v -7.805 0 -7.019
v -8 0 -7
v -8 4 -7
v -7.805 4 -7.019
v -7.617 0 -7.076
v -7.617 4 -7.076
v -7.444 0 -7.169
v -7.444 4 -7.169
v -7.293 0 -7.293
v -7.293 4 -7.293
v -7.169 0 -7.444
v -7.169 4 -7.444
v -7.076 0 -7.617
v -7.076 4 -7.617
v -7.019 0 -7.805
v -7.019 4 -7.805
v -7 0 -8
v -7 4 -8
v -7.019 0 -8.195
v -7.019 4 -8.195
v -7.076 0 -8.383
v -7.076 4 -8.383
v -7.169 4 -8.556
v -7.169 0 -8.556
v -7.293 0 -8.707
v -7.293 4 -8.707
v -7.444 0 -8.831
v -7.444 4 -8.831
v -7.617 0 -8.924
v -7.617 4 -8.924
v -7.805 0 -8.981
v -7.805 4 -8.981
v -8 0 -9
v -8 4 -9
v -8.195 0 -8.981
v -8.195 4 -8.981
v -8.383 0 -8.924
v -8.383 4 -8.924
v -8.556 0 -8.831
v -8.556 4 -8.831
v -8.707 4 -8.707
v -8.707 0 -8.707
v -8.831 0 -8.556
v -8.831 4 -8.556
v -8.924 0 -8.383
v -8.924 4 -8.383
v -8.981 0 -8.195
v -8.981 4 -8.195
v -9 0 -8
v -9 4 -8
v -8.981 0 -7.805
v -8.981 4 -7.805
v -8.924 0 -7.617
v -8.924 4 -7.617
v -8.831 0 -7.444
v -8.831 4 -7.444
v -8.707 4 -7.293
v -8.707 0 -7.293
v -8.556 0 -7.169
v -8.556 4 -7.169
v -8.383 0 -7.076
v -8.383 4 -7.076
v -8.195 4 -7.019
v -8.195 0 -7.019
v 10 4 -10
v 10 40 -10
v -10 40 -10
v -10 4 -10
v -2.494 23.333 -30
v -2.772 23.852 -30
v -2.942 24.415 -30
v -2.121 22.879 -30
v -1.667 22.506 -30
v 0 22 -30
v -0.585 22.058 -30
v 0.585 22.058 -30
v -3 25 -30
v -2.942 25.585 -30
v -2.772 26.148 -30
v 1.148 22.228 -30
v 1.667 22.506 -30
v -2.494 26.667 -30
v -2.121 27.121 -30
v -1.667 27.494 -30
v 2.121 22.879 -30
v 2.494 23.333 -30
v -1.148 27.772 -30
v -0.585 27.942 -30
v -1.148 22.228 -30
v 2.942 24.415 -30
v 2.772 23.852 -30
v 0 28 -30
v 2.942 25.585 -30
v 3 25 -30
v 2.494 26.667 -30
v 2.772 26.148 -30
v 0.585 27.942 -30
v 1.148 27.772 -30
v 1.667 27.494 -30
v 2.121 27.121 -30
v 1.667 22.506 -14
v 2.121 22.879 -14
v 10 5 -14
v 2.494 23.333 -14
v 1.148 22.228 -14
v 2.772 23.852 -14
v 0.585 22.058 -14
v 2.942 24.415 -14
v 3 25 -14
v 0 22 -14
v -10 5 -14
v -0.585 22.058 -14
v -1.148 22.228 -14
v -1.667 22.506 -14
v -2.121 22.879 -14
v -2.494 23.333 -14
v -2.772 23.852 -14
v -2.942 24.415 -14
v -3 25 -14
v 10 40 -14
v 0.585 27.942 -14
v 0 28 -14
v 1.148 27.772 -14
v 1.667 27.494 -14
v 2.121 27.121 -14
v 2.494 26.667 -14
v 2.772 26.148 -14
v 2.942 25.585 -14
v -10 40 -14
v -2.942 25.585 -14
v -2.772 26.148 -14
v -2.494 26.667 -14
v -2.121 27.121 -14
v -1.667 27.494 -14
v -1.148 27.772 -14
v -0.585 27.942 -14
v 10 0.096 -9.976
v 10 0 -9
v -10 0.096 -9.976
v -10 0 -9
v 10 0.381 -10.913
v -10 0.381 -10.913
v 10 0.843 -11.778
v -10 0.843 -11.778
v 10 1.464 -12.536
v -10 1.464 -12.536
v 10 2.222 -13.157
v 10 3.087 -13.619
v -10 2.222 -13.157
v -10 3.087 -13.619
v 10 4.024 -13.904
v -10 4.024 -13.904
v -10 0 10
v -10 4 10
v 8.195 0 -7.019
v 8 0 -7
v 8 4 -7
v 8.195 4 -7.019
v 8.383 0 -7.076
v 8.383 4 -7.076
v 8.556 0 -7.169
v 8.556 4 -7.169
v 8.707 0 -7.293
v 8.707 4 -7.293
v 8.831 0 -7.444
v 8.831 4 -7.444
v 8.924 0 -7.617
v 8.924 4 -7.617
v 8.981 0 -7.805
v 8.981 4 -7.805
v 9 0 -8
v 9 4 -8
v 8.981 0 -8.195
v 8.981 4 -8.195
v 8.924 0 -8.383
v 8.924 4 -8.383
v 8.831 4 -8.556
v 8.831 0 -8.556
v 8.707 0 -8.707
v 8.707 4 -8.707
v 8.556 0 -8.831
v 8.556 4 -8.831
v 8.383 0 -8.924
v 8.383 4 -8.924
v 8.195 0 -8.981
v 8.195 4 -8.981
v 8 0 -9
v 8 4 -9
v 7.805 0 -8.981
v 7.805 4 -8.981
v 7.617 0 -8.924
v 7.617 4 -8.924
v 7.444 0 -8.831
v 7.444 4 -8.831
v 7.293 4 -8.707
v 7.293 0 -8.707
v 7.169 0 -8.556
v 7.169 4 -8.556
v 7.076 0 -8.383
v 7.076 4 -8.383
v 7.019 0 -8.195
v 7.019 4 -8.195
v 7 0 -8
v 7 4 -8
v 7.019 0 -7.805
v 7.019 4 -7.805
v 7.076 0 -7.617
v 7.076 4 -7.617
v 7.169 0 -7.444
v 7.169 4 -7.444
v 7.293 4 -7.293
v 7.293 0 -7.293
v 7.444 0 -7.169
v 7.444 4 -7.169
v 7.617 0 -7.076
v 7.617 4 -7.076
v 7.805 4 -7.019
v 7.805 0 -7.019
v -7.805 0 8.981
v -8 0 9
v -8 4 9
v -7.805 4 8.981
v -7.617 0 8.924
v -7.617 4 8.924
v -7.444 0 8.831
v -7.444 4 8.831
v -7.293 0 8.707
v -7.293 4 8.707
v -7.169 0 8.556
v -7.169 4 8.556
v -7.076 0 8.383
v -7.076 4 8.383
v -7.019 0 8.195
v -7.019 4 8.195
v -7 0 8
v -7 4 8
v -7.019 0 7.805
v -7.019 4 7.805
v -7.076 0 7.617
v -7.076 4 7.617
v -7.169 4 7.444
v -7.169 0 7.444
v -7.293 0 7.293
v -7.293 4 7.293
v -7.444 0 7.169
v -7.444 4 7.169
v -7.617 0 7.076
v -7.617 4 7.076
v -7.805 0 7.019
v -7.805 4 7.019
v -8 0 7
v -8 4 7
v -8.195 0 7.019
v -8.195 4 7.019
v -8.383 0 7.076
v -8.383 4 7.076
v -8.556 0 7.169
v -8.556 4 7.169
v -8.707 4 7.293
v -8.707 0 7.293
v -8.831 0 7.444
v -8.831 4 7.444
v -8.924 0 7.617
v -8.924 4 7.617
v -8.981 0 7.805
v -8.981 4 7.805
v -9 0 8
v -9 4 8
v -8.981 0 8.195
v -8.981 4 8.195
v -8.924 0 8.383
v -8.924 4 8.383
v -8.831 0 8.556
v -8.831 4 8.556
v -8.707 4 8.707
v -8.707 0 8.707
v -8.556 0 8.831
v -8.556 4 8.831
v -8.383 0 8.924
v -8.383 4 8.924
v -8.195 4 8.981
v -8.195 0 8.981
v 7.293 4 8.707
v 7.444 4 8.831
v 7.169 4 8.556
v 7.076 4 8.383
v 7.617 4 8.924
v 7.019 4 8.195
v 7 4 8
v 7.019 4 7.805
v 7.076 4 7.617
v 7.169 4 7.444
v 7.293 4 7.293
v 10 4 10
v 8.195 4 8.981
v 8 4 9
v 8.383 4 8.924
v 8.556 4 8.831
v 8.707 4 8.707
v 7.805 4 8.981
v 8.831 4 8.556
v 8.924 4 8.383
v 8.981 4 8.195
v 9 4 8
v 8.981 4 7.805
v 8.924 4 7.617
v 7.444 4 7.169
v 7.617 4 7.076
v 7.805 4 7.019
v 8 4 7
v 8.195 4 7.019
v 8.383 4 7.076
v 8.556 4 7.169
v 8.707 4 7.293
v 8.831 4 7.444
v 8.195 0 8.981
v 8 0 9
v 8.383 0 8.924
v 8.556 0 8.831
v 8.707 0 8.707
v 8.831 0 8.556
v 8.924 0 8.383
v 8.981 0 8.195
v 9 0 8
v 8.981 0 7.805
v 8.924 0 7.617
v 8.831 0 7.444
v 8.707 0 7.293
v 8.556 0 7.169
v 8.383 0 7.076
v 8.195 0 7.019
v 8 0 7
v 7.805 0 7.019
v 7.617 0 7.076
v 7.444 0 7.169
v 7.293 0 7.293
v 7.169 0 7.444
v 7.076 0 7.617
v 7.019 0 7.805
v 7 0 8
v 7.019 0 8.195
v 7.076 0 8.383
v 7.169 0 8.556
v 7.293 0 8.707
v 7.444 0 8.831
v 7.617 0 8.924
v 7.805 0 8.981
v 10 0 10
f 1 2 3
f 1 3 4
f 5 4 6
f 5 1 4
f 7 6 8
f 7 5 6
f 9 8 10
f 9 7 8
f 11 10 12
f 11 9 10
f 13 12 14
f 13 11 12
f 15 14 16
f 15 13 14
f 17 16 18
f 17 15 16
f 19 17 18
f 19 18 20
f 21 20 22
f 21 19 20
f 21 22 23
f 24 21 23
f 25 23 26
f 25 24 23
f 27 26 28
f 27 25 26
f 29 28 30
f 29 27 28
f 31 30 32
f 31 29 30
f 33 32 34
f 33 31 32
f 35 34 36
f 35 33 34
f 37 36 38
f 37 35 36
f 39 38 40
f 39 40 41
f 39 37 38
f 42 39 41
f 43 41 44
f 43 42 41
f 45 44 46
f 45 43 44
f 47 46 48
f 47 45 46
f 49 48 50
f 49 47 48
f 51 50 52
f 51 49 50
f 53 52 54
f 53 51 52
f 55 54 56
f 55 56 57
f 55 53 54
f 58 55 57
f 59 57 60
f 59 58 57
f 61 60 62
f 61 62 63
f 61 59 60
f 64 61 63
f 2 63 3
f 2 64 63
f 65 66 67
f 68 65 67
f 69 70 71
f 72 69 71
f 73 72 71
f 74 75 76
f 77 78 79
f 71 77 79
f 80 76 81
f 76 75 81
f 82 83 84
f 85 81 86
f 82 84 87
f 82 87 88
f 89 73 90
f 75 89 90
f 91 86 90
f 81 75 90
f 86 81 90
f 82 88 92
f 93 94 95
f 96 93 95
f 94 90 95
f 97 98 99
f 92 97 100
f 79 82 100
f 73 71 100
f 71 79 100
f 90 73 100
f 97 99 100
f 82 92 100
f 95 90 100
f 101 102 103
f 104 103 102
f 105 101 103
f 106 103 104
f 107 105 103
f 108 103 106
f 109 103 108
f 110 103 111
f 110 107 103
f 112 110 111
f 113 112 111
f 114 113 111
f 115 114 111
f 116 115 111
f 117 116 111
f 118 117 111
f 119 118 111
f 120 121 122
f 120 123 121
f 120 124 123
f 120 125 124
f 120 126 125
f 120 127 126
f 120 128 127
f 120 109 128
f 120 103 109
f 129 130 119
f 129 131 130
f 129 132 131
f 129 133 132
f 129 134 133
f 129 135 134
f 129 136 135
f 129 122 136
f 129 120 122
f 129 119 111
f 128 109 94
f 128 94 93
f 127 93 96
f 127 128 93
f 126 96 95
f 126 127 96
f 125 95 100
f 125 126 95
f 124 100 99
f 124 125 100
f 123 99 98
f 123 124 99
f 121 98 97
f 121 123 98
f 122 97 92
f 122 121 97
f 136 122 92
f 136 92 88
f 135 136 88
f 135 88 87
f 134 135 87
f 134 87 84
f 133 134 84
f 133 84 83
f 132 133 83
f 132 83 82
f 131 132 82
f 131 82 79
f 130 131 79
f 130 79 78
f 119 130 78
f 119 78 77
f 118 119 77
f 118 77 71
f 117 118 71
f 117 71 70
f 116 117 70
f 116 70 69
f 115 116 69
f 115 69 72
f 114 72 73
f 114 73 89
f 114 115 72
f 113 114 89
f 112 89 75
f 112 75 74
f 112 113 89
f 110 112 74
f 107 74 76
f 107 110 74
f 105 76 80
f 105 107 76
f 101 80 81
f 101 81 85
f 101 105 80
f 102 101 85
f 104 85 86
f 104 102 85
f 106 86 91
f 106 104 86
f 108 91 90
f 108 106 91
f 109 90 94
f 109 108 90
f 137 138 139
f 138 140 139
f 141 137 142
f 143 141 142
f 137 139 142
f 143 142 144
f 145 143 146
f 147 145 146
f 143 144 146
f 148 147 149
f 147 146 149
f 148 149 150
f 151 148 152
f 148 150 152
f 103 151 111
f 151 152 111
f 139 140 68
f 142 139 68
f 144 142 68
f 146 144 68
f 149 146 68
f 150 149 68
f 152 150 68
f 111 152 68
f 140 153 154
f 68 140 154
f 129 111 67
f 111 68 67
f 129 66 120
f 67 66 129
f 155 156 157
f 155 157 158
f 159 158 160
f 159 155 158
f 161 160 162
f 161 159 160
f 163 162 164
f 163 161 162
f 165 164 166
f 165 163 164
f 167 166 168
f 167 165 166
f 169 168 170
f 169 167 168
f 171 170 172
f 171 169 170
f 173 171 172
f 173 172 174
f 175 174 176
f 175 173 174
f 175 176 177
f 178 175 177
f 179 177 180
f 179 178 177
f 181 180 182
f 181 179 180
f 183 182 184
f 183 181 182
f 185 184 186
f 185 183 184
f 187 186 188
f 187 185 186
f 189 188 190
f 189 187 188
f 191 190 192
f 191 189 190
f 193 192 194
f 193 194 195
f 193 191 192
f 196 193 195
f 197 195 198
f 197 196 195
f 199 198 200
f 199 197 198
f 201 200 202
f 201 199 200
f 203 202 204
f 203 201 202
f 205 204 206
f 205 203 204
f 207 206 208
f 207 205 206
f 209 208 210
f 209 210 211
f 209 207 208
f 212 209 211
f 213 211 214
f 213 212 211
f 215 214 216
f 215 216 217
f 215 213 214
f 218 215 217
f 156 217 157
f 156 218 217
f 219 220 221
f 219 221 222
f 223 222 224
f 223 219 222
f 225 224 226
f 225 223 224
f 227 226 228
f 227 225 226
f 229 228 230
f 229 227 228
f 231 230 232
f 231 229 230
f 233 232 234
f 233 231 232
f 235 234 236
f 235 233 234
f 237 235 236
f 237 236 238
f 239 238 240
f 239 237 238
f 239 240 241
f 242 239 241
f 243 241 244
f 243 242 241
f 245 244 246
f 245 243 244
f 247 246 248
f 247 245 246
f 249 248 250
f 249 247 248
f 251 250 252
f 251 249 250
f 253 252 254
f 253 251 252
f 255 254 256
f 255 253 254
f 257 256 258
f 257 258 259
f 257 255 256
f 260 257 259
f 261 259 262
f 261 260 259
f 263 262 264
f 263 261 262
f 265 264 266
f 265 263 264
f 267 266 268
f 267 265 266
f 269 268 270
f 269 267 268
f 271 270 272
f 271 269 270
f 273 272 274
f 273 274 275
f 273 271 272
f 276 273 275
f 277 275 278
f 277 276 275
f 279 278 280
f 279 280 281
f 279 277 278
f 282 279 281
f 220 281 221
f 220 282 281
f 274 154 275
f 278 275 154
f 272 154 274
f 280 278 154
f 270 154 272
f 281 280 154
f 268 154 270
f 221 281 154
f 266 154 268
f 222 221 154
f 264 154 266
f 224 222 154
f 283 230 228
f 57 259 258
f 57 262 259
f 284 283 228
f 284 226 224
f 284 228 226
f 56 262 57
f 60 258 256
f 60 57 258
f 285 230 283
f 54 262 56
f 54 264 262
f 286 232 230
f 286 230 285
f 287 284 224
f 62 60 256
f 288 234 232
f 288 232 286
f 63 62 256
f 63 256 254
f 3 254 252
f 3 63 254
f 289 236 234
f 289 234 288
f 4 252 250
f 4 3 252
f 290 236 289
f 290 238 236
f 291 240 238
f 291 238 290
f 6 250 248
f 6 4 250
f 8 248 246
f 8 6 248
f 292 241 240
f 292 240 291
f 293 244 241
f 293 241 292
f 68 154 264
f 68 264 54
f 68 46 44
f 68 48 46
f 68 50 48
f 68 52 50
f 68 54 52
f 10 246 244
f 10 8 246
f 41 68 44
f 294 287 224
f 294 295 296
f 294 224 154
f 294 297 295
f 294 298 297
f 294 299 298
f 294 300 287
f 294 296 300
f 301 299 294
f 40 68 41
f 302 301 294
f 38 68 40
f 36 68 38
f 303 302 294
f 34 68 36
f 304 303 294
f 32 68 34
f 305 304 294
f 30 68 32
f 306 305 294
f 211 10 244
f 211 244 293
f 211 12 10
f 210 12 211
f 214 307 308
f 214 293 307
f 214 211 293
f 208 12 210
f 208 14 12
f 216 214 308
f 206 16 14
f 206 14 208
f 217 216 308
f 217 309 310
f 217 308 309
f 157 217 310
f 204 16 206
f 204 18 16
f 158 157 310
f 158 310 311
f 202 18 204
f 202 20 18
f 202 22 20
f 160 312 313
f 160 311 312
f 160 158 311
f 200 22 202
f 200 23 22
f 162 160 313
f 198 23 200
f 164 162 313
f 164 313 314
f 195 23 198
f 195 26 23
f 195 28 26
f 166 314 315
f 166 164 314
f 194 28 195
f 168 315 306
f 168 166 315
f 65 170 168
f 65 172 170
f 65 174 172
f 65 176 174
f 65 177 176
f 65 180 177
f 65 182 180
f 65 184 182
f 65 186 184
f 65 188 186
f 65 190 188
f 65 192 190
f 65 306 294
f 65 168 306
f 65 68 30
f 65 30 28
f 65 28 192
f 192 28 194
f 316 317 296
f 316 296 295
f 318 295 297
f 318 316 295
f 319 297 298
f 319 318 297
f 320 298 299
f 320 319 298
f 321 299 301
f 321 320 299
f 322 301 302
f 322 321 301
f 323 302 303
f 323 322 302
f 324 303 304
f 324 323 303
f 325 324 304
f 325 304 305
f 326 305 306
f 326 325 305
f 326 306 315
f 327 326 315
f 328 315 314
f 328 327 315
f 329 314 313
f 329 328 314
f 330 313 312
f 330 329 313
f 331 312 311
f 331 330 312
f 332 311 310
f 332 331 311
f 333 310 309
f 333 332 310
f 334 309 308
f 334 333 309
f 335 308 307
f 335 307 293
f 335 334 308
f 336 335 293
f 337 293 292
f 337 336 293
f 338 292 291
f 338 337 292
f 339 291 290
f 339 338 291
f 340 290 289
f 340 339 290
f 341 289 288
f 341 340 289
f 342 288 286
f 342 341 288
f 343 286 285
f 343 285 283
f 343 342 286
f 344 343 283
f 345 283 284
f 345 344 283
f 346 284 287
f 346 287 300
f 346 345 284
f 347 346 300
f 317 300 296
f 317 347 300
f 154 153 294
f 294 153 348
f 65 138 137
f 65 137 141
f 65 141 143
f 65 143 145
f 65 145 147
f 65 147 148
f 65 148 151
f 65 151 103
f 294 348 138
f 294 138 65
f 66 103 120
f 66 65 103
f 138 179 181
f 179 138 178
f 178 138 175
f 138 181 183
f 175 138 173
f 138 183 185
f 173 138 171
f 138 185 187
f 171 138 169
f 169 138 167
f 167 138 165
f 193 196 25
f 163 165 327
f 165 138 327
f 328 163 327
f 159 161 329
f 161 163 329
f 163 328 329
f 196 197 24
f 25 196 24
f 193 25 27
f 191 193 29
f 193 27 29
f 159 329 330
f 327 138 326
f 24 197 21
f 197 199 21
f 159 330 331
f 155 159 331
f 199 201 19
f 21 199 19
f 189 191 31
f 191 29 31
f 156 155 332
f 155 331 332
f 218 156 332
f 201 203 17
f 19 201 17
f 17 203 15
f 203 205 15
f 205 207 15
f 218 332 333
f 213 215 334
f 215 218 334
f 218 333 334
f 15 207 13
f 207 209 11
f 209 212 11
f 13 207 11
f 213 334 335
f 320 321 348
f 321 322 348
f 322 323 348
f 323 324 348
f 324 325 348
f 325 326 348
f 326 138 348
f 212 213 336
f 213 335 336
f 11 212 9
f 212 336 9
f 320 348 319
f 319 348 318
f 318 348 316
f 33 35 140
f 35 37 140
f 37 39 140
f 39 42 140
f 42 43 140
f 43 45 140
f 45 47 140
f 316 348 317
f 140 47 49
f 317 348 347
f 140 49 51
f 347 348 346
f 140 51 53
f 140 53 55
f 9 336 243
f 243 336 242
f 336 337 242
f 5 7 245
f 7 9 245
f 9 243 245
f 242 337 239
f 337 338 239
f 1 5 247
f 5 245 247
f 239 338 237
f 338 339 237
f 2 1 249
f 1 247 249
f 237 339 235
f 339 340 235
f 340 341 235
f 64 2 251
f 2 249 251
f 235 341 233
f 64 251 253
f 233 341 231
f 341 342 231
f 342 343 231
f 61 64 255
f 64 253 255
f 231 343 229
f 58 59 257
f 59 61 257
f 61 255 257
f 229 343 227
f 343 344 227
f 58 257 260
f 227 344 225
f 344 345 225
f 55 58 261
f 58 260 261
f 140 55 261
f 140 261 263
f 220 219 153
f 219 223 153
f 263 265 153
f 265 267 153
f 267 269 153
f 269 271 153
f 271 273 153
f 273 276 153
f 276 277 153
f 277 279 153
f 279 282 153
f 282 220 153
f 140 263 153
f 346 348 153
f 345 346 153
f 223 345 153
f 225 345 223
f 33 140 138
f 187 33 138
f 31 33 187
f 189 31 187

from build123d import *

# Parameters (mm, degrees)
SKETCH1_W           = 20
SKETCH1_H           = 20
SKETCH1_R           = 1
SKETCH1_R_2         = 0.9999999999999998
SKETCH1_R_3         = 1.0000000000000013
SKETCH1_R_4         = 0.9999999999999996
BOSS_EXTRUDE1_DEPTH = 4
SKETCH2_W           = 20
SKETCH2_H           = 40
SKETCH2_R           = 2.9999999999999996
BOSS_EXTRUDE2_DEPTH = 4
FILLET1_R           = 5
SKETCH3_R           = 2.9999999999999996
BOSS_EXTRUDE3_DEPTH = 20


with BuildPart() as part:
    # Sketch1 → Boss-Extrude1 (new body)
    with BuildSketch(Plane(origin=(0, 0, 0), x_dir=(1, 0, 0), z_dir=(0, 1, 0))):
        Rectangle(SKETCH1_W, SKETCH1_H)
        with Locations((-8.000000000000002, 8.000000000000002)):
            Circle(SKETCH1_R, mode=Mode.SUBTRACT)
        with Locations((-8.000000000000002, -7.999999999999998)):
            Circle(SKETCH1_R_2, mode=Mode.SUBTRACT)
        with Locations((7.999999999999998, -7.999999999999998)):
            Circle(SKETCH1_R_3, mode=Mode.SUBTRACT)
        with Locations((8, 8.000000000000002)):
            Circle(SKETCH1_R_4, mode=Mode.SUBTRACT)
    extrude(amount=BOSS_EXTRUDE1_DEPTH)

    # Sketch2 → Boss-Extrude2 (add)
    with BuildSketch(Plane(origin=(0, 0, -10.000000000000002), x_dir=(-1, 0, 0), z_dir=(0, 0, -1))):
        with Locations((1.78e-15, 20)):
            Rectangle(SKETCH2_W, SKETCH2_H)
        with Locations((0, 25)):
            Circle(SKETCH2_R, mode=Mode.SUBTRACT)
    extrude(amount=BOSS_EXTRUDE2_DEPTH)

    # Fillet1
    fillet1_edges = [part.edges().sort_by_distance(p)[0] for p in [
        (-1.78e-15, 0, -14.000000000000002),
    ]]
    fillet(fillet1_edges, radius=FILLET1_R)

    # Sketch3 → Boss-Extrude3 (add)
    with BuildSketch(Plane.XY.offset(-10.000000000000002)):
        with Locations((0, 25)):
            Circle(SKETCH3_R)
    extrude(amount=-BOSS_EXTRUDE3_DEPTH)


solid = part.part
